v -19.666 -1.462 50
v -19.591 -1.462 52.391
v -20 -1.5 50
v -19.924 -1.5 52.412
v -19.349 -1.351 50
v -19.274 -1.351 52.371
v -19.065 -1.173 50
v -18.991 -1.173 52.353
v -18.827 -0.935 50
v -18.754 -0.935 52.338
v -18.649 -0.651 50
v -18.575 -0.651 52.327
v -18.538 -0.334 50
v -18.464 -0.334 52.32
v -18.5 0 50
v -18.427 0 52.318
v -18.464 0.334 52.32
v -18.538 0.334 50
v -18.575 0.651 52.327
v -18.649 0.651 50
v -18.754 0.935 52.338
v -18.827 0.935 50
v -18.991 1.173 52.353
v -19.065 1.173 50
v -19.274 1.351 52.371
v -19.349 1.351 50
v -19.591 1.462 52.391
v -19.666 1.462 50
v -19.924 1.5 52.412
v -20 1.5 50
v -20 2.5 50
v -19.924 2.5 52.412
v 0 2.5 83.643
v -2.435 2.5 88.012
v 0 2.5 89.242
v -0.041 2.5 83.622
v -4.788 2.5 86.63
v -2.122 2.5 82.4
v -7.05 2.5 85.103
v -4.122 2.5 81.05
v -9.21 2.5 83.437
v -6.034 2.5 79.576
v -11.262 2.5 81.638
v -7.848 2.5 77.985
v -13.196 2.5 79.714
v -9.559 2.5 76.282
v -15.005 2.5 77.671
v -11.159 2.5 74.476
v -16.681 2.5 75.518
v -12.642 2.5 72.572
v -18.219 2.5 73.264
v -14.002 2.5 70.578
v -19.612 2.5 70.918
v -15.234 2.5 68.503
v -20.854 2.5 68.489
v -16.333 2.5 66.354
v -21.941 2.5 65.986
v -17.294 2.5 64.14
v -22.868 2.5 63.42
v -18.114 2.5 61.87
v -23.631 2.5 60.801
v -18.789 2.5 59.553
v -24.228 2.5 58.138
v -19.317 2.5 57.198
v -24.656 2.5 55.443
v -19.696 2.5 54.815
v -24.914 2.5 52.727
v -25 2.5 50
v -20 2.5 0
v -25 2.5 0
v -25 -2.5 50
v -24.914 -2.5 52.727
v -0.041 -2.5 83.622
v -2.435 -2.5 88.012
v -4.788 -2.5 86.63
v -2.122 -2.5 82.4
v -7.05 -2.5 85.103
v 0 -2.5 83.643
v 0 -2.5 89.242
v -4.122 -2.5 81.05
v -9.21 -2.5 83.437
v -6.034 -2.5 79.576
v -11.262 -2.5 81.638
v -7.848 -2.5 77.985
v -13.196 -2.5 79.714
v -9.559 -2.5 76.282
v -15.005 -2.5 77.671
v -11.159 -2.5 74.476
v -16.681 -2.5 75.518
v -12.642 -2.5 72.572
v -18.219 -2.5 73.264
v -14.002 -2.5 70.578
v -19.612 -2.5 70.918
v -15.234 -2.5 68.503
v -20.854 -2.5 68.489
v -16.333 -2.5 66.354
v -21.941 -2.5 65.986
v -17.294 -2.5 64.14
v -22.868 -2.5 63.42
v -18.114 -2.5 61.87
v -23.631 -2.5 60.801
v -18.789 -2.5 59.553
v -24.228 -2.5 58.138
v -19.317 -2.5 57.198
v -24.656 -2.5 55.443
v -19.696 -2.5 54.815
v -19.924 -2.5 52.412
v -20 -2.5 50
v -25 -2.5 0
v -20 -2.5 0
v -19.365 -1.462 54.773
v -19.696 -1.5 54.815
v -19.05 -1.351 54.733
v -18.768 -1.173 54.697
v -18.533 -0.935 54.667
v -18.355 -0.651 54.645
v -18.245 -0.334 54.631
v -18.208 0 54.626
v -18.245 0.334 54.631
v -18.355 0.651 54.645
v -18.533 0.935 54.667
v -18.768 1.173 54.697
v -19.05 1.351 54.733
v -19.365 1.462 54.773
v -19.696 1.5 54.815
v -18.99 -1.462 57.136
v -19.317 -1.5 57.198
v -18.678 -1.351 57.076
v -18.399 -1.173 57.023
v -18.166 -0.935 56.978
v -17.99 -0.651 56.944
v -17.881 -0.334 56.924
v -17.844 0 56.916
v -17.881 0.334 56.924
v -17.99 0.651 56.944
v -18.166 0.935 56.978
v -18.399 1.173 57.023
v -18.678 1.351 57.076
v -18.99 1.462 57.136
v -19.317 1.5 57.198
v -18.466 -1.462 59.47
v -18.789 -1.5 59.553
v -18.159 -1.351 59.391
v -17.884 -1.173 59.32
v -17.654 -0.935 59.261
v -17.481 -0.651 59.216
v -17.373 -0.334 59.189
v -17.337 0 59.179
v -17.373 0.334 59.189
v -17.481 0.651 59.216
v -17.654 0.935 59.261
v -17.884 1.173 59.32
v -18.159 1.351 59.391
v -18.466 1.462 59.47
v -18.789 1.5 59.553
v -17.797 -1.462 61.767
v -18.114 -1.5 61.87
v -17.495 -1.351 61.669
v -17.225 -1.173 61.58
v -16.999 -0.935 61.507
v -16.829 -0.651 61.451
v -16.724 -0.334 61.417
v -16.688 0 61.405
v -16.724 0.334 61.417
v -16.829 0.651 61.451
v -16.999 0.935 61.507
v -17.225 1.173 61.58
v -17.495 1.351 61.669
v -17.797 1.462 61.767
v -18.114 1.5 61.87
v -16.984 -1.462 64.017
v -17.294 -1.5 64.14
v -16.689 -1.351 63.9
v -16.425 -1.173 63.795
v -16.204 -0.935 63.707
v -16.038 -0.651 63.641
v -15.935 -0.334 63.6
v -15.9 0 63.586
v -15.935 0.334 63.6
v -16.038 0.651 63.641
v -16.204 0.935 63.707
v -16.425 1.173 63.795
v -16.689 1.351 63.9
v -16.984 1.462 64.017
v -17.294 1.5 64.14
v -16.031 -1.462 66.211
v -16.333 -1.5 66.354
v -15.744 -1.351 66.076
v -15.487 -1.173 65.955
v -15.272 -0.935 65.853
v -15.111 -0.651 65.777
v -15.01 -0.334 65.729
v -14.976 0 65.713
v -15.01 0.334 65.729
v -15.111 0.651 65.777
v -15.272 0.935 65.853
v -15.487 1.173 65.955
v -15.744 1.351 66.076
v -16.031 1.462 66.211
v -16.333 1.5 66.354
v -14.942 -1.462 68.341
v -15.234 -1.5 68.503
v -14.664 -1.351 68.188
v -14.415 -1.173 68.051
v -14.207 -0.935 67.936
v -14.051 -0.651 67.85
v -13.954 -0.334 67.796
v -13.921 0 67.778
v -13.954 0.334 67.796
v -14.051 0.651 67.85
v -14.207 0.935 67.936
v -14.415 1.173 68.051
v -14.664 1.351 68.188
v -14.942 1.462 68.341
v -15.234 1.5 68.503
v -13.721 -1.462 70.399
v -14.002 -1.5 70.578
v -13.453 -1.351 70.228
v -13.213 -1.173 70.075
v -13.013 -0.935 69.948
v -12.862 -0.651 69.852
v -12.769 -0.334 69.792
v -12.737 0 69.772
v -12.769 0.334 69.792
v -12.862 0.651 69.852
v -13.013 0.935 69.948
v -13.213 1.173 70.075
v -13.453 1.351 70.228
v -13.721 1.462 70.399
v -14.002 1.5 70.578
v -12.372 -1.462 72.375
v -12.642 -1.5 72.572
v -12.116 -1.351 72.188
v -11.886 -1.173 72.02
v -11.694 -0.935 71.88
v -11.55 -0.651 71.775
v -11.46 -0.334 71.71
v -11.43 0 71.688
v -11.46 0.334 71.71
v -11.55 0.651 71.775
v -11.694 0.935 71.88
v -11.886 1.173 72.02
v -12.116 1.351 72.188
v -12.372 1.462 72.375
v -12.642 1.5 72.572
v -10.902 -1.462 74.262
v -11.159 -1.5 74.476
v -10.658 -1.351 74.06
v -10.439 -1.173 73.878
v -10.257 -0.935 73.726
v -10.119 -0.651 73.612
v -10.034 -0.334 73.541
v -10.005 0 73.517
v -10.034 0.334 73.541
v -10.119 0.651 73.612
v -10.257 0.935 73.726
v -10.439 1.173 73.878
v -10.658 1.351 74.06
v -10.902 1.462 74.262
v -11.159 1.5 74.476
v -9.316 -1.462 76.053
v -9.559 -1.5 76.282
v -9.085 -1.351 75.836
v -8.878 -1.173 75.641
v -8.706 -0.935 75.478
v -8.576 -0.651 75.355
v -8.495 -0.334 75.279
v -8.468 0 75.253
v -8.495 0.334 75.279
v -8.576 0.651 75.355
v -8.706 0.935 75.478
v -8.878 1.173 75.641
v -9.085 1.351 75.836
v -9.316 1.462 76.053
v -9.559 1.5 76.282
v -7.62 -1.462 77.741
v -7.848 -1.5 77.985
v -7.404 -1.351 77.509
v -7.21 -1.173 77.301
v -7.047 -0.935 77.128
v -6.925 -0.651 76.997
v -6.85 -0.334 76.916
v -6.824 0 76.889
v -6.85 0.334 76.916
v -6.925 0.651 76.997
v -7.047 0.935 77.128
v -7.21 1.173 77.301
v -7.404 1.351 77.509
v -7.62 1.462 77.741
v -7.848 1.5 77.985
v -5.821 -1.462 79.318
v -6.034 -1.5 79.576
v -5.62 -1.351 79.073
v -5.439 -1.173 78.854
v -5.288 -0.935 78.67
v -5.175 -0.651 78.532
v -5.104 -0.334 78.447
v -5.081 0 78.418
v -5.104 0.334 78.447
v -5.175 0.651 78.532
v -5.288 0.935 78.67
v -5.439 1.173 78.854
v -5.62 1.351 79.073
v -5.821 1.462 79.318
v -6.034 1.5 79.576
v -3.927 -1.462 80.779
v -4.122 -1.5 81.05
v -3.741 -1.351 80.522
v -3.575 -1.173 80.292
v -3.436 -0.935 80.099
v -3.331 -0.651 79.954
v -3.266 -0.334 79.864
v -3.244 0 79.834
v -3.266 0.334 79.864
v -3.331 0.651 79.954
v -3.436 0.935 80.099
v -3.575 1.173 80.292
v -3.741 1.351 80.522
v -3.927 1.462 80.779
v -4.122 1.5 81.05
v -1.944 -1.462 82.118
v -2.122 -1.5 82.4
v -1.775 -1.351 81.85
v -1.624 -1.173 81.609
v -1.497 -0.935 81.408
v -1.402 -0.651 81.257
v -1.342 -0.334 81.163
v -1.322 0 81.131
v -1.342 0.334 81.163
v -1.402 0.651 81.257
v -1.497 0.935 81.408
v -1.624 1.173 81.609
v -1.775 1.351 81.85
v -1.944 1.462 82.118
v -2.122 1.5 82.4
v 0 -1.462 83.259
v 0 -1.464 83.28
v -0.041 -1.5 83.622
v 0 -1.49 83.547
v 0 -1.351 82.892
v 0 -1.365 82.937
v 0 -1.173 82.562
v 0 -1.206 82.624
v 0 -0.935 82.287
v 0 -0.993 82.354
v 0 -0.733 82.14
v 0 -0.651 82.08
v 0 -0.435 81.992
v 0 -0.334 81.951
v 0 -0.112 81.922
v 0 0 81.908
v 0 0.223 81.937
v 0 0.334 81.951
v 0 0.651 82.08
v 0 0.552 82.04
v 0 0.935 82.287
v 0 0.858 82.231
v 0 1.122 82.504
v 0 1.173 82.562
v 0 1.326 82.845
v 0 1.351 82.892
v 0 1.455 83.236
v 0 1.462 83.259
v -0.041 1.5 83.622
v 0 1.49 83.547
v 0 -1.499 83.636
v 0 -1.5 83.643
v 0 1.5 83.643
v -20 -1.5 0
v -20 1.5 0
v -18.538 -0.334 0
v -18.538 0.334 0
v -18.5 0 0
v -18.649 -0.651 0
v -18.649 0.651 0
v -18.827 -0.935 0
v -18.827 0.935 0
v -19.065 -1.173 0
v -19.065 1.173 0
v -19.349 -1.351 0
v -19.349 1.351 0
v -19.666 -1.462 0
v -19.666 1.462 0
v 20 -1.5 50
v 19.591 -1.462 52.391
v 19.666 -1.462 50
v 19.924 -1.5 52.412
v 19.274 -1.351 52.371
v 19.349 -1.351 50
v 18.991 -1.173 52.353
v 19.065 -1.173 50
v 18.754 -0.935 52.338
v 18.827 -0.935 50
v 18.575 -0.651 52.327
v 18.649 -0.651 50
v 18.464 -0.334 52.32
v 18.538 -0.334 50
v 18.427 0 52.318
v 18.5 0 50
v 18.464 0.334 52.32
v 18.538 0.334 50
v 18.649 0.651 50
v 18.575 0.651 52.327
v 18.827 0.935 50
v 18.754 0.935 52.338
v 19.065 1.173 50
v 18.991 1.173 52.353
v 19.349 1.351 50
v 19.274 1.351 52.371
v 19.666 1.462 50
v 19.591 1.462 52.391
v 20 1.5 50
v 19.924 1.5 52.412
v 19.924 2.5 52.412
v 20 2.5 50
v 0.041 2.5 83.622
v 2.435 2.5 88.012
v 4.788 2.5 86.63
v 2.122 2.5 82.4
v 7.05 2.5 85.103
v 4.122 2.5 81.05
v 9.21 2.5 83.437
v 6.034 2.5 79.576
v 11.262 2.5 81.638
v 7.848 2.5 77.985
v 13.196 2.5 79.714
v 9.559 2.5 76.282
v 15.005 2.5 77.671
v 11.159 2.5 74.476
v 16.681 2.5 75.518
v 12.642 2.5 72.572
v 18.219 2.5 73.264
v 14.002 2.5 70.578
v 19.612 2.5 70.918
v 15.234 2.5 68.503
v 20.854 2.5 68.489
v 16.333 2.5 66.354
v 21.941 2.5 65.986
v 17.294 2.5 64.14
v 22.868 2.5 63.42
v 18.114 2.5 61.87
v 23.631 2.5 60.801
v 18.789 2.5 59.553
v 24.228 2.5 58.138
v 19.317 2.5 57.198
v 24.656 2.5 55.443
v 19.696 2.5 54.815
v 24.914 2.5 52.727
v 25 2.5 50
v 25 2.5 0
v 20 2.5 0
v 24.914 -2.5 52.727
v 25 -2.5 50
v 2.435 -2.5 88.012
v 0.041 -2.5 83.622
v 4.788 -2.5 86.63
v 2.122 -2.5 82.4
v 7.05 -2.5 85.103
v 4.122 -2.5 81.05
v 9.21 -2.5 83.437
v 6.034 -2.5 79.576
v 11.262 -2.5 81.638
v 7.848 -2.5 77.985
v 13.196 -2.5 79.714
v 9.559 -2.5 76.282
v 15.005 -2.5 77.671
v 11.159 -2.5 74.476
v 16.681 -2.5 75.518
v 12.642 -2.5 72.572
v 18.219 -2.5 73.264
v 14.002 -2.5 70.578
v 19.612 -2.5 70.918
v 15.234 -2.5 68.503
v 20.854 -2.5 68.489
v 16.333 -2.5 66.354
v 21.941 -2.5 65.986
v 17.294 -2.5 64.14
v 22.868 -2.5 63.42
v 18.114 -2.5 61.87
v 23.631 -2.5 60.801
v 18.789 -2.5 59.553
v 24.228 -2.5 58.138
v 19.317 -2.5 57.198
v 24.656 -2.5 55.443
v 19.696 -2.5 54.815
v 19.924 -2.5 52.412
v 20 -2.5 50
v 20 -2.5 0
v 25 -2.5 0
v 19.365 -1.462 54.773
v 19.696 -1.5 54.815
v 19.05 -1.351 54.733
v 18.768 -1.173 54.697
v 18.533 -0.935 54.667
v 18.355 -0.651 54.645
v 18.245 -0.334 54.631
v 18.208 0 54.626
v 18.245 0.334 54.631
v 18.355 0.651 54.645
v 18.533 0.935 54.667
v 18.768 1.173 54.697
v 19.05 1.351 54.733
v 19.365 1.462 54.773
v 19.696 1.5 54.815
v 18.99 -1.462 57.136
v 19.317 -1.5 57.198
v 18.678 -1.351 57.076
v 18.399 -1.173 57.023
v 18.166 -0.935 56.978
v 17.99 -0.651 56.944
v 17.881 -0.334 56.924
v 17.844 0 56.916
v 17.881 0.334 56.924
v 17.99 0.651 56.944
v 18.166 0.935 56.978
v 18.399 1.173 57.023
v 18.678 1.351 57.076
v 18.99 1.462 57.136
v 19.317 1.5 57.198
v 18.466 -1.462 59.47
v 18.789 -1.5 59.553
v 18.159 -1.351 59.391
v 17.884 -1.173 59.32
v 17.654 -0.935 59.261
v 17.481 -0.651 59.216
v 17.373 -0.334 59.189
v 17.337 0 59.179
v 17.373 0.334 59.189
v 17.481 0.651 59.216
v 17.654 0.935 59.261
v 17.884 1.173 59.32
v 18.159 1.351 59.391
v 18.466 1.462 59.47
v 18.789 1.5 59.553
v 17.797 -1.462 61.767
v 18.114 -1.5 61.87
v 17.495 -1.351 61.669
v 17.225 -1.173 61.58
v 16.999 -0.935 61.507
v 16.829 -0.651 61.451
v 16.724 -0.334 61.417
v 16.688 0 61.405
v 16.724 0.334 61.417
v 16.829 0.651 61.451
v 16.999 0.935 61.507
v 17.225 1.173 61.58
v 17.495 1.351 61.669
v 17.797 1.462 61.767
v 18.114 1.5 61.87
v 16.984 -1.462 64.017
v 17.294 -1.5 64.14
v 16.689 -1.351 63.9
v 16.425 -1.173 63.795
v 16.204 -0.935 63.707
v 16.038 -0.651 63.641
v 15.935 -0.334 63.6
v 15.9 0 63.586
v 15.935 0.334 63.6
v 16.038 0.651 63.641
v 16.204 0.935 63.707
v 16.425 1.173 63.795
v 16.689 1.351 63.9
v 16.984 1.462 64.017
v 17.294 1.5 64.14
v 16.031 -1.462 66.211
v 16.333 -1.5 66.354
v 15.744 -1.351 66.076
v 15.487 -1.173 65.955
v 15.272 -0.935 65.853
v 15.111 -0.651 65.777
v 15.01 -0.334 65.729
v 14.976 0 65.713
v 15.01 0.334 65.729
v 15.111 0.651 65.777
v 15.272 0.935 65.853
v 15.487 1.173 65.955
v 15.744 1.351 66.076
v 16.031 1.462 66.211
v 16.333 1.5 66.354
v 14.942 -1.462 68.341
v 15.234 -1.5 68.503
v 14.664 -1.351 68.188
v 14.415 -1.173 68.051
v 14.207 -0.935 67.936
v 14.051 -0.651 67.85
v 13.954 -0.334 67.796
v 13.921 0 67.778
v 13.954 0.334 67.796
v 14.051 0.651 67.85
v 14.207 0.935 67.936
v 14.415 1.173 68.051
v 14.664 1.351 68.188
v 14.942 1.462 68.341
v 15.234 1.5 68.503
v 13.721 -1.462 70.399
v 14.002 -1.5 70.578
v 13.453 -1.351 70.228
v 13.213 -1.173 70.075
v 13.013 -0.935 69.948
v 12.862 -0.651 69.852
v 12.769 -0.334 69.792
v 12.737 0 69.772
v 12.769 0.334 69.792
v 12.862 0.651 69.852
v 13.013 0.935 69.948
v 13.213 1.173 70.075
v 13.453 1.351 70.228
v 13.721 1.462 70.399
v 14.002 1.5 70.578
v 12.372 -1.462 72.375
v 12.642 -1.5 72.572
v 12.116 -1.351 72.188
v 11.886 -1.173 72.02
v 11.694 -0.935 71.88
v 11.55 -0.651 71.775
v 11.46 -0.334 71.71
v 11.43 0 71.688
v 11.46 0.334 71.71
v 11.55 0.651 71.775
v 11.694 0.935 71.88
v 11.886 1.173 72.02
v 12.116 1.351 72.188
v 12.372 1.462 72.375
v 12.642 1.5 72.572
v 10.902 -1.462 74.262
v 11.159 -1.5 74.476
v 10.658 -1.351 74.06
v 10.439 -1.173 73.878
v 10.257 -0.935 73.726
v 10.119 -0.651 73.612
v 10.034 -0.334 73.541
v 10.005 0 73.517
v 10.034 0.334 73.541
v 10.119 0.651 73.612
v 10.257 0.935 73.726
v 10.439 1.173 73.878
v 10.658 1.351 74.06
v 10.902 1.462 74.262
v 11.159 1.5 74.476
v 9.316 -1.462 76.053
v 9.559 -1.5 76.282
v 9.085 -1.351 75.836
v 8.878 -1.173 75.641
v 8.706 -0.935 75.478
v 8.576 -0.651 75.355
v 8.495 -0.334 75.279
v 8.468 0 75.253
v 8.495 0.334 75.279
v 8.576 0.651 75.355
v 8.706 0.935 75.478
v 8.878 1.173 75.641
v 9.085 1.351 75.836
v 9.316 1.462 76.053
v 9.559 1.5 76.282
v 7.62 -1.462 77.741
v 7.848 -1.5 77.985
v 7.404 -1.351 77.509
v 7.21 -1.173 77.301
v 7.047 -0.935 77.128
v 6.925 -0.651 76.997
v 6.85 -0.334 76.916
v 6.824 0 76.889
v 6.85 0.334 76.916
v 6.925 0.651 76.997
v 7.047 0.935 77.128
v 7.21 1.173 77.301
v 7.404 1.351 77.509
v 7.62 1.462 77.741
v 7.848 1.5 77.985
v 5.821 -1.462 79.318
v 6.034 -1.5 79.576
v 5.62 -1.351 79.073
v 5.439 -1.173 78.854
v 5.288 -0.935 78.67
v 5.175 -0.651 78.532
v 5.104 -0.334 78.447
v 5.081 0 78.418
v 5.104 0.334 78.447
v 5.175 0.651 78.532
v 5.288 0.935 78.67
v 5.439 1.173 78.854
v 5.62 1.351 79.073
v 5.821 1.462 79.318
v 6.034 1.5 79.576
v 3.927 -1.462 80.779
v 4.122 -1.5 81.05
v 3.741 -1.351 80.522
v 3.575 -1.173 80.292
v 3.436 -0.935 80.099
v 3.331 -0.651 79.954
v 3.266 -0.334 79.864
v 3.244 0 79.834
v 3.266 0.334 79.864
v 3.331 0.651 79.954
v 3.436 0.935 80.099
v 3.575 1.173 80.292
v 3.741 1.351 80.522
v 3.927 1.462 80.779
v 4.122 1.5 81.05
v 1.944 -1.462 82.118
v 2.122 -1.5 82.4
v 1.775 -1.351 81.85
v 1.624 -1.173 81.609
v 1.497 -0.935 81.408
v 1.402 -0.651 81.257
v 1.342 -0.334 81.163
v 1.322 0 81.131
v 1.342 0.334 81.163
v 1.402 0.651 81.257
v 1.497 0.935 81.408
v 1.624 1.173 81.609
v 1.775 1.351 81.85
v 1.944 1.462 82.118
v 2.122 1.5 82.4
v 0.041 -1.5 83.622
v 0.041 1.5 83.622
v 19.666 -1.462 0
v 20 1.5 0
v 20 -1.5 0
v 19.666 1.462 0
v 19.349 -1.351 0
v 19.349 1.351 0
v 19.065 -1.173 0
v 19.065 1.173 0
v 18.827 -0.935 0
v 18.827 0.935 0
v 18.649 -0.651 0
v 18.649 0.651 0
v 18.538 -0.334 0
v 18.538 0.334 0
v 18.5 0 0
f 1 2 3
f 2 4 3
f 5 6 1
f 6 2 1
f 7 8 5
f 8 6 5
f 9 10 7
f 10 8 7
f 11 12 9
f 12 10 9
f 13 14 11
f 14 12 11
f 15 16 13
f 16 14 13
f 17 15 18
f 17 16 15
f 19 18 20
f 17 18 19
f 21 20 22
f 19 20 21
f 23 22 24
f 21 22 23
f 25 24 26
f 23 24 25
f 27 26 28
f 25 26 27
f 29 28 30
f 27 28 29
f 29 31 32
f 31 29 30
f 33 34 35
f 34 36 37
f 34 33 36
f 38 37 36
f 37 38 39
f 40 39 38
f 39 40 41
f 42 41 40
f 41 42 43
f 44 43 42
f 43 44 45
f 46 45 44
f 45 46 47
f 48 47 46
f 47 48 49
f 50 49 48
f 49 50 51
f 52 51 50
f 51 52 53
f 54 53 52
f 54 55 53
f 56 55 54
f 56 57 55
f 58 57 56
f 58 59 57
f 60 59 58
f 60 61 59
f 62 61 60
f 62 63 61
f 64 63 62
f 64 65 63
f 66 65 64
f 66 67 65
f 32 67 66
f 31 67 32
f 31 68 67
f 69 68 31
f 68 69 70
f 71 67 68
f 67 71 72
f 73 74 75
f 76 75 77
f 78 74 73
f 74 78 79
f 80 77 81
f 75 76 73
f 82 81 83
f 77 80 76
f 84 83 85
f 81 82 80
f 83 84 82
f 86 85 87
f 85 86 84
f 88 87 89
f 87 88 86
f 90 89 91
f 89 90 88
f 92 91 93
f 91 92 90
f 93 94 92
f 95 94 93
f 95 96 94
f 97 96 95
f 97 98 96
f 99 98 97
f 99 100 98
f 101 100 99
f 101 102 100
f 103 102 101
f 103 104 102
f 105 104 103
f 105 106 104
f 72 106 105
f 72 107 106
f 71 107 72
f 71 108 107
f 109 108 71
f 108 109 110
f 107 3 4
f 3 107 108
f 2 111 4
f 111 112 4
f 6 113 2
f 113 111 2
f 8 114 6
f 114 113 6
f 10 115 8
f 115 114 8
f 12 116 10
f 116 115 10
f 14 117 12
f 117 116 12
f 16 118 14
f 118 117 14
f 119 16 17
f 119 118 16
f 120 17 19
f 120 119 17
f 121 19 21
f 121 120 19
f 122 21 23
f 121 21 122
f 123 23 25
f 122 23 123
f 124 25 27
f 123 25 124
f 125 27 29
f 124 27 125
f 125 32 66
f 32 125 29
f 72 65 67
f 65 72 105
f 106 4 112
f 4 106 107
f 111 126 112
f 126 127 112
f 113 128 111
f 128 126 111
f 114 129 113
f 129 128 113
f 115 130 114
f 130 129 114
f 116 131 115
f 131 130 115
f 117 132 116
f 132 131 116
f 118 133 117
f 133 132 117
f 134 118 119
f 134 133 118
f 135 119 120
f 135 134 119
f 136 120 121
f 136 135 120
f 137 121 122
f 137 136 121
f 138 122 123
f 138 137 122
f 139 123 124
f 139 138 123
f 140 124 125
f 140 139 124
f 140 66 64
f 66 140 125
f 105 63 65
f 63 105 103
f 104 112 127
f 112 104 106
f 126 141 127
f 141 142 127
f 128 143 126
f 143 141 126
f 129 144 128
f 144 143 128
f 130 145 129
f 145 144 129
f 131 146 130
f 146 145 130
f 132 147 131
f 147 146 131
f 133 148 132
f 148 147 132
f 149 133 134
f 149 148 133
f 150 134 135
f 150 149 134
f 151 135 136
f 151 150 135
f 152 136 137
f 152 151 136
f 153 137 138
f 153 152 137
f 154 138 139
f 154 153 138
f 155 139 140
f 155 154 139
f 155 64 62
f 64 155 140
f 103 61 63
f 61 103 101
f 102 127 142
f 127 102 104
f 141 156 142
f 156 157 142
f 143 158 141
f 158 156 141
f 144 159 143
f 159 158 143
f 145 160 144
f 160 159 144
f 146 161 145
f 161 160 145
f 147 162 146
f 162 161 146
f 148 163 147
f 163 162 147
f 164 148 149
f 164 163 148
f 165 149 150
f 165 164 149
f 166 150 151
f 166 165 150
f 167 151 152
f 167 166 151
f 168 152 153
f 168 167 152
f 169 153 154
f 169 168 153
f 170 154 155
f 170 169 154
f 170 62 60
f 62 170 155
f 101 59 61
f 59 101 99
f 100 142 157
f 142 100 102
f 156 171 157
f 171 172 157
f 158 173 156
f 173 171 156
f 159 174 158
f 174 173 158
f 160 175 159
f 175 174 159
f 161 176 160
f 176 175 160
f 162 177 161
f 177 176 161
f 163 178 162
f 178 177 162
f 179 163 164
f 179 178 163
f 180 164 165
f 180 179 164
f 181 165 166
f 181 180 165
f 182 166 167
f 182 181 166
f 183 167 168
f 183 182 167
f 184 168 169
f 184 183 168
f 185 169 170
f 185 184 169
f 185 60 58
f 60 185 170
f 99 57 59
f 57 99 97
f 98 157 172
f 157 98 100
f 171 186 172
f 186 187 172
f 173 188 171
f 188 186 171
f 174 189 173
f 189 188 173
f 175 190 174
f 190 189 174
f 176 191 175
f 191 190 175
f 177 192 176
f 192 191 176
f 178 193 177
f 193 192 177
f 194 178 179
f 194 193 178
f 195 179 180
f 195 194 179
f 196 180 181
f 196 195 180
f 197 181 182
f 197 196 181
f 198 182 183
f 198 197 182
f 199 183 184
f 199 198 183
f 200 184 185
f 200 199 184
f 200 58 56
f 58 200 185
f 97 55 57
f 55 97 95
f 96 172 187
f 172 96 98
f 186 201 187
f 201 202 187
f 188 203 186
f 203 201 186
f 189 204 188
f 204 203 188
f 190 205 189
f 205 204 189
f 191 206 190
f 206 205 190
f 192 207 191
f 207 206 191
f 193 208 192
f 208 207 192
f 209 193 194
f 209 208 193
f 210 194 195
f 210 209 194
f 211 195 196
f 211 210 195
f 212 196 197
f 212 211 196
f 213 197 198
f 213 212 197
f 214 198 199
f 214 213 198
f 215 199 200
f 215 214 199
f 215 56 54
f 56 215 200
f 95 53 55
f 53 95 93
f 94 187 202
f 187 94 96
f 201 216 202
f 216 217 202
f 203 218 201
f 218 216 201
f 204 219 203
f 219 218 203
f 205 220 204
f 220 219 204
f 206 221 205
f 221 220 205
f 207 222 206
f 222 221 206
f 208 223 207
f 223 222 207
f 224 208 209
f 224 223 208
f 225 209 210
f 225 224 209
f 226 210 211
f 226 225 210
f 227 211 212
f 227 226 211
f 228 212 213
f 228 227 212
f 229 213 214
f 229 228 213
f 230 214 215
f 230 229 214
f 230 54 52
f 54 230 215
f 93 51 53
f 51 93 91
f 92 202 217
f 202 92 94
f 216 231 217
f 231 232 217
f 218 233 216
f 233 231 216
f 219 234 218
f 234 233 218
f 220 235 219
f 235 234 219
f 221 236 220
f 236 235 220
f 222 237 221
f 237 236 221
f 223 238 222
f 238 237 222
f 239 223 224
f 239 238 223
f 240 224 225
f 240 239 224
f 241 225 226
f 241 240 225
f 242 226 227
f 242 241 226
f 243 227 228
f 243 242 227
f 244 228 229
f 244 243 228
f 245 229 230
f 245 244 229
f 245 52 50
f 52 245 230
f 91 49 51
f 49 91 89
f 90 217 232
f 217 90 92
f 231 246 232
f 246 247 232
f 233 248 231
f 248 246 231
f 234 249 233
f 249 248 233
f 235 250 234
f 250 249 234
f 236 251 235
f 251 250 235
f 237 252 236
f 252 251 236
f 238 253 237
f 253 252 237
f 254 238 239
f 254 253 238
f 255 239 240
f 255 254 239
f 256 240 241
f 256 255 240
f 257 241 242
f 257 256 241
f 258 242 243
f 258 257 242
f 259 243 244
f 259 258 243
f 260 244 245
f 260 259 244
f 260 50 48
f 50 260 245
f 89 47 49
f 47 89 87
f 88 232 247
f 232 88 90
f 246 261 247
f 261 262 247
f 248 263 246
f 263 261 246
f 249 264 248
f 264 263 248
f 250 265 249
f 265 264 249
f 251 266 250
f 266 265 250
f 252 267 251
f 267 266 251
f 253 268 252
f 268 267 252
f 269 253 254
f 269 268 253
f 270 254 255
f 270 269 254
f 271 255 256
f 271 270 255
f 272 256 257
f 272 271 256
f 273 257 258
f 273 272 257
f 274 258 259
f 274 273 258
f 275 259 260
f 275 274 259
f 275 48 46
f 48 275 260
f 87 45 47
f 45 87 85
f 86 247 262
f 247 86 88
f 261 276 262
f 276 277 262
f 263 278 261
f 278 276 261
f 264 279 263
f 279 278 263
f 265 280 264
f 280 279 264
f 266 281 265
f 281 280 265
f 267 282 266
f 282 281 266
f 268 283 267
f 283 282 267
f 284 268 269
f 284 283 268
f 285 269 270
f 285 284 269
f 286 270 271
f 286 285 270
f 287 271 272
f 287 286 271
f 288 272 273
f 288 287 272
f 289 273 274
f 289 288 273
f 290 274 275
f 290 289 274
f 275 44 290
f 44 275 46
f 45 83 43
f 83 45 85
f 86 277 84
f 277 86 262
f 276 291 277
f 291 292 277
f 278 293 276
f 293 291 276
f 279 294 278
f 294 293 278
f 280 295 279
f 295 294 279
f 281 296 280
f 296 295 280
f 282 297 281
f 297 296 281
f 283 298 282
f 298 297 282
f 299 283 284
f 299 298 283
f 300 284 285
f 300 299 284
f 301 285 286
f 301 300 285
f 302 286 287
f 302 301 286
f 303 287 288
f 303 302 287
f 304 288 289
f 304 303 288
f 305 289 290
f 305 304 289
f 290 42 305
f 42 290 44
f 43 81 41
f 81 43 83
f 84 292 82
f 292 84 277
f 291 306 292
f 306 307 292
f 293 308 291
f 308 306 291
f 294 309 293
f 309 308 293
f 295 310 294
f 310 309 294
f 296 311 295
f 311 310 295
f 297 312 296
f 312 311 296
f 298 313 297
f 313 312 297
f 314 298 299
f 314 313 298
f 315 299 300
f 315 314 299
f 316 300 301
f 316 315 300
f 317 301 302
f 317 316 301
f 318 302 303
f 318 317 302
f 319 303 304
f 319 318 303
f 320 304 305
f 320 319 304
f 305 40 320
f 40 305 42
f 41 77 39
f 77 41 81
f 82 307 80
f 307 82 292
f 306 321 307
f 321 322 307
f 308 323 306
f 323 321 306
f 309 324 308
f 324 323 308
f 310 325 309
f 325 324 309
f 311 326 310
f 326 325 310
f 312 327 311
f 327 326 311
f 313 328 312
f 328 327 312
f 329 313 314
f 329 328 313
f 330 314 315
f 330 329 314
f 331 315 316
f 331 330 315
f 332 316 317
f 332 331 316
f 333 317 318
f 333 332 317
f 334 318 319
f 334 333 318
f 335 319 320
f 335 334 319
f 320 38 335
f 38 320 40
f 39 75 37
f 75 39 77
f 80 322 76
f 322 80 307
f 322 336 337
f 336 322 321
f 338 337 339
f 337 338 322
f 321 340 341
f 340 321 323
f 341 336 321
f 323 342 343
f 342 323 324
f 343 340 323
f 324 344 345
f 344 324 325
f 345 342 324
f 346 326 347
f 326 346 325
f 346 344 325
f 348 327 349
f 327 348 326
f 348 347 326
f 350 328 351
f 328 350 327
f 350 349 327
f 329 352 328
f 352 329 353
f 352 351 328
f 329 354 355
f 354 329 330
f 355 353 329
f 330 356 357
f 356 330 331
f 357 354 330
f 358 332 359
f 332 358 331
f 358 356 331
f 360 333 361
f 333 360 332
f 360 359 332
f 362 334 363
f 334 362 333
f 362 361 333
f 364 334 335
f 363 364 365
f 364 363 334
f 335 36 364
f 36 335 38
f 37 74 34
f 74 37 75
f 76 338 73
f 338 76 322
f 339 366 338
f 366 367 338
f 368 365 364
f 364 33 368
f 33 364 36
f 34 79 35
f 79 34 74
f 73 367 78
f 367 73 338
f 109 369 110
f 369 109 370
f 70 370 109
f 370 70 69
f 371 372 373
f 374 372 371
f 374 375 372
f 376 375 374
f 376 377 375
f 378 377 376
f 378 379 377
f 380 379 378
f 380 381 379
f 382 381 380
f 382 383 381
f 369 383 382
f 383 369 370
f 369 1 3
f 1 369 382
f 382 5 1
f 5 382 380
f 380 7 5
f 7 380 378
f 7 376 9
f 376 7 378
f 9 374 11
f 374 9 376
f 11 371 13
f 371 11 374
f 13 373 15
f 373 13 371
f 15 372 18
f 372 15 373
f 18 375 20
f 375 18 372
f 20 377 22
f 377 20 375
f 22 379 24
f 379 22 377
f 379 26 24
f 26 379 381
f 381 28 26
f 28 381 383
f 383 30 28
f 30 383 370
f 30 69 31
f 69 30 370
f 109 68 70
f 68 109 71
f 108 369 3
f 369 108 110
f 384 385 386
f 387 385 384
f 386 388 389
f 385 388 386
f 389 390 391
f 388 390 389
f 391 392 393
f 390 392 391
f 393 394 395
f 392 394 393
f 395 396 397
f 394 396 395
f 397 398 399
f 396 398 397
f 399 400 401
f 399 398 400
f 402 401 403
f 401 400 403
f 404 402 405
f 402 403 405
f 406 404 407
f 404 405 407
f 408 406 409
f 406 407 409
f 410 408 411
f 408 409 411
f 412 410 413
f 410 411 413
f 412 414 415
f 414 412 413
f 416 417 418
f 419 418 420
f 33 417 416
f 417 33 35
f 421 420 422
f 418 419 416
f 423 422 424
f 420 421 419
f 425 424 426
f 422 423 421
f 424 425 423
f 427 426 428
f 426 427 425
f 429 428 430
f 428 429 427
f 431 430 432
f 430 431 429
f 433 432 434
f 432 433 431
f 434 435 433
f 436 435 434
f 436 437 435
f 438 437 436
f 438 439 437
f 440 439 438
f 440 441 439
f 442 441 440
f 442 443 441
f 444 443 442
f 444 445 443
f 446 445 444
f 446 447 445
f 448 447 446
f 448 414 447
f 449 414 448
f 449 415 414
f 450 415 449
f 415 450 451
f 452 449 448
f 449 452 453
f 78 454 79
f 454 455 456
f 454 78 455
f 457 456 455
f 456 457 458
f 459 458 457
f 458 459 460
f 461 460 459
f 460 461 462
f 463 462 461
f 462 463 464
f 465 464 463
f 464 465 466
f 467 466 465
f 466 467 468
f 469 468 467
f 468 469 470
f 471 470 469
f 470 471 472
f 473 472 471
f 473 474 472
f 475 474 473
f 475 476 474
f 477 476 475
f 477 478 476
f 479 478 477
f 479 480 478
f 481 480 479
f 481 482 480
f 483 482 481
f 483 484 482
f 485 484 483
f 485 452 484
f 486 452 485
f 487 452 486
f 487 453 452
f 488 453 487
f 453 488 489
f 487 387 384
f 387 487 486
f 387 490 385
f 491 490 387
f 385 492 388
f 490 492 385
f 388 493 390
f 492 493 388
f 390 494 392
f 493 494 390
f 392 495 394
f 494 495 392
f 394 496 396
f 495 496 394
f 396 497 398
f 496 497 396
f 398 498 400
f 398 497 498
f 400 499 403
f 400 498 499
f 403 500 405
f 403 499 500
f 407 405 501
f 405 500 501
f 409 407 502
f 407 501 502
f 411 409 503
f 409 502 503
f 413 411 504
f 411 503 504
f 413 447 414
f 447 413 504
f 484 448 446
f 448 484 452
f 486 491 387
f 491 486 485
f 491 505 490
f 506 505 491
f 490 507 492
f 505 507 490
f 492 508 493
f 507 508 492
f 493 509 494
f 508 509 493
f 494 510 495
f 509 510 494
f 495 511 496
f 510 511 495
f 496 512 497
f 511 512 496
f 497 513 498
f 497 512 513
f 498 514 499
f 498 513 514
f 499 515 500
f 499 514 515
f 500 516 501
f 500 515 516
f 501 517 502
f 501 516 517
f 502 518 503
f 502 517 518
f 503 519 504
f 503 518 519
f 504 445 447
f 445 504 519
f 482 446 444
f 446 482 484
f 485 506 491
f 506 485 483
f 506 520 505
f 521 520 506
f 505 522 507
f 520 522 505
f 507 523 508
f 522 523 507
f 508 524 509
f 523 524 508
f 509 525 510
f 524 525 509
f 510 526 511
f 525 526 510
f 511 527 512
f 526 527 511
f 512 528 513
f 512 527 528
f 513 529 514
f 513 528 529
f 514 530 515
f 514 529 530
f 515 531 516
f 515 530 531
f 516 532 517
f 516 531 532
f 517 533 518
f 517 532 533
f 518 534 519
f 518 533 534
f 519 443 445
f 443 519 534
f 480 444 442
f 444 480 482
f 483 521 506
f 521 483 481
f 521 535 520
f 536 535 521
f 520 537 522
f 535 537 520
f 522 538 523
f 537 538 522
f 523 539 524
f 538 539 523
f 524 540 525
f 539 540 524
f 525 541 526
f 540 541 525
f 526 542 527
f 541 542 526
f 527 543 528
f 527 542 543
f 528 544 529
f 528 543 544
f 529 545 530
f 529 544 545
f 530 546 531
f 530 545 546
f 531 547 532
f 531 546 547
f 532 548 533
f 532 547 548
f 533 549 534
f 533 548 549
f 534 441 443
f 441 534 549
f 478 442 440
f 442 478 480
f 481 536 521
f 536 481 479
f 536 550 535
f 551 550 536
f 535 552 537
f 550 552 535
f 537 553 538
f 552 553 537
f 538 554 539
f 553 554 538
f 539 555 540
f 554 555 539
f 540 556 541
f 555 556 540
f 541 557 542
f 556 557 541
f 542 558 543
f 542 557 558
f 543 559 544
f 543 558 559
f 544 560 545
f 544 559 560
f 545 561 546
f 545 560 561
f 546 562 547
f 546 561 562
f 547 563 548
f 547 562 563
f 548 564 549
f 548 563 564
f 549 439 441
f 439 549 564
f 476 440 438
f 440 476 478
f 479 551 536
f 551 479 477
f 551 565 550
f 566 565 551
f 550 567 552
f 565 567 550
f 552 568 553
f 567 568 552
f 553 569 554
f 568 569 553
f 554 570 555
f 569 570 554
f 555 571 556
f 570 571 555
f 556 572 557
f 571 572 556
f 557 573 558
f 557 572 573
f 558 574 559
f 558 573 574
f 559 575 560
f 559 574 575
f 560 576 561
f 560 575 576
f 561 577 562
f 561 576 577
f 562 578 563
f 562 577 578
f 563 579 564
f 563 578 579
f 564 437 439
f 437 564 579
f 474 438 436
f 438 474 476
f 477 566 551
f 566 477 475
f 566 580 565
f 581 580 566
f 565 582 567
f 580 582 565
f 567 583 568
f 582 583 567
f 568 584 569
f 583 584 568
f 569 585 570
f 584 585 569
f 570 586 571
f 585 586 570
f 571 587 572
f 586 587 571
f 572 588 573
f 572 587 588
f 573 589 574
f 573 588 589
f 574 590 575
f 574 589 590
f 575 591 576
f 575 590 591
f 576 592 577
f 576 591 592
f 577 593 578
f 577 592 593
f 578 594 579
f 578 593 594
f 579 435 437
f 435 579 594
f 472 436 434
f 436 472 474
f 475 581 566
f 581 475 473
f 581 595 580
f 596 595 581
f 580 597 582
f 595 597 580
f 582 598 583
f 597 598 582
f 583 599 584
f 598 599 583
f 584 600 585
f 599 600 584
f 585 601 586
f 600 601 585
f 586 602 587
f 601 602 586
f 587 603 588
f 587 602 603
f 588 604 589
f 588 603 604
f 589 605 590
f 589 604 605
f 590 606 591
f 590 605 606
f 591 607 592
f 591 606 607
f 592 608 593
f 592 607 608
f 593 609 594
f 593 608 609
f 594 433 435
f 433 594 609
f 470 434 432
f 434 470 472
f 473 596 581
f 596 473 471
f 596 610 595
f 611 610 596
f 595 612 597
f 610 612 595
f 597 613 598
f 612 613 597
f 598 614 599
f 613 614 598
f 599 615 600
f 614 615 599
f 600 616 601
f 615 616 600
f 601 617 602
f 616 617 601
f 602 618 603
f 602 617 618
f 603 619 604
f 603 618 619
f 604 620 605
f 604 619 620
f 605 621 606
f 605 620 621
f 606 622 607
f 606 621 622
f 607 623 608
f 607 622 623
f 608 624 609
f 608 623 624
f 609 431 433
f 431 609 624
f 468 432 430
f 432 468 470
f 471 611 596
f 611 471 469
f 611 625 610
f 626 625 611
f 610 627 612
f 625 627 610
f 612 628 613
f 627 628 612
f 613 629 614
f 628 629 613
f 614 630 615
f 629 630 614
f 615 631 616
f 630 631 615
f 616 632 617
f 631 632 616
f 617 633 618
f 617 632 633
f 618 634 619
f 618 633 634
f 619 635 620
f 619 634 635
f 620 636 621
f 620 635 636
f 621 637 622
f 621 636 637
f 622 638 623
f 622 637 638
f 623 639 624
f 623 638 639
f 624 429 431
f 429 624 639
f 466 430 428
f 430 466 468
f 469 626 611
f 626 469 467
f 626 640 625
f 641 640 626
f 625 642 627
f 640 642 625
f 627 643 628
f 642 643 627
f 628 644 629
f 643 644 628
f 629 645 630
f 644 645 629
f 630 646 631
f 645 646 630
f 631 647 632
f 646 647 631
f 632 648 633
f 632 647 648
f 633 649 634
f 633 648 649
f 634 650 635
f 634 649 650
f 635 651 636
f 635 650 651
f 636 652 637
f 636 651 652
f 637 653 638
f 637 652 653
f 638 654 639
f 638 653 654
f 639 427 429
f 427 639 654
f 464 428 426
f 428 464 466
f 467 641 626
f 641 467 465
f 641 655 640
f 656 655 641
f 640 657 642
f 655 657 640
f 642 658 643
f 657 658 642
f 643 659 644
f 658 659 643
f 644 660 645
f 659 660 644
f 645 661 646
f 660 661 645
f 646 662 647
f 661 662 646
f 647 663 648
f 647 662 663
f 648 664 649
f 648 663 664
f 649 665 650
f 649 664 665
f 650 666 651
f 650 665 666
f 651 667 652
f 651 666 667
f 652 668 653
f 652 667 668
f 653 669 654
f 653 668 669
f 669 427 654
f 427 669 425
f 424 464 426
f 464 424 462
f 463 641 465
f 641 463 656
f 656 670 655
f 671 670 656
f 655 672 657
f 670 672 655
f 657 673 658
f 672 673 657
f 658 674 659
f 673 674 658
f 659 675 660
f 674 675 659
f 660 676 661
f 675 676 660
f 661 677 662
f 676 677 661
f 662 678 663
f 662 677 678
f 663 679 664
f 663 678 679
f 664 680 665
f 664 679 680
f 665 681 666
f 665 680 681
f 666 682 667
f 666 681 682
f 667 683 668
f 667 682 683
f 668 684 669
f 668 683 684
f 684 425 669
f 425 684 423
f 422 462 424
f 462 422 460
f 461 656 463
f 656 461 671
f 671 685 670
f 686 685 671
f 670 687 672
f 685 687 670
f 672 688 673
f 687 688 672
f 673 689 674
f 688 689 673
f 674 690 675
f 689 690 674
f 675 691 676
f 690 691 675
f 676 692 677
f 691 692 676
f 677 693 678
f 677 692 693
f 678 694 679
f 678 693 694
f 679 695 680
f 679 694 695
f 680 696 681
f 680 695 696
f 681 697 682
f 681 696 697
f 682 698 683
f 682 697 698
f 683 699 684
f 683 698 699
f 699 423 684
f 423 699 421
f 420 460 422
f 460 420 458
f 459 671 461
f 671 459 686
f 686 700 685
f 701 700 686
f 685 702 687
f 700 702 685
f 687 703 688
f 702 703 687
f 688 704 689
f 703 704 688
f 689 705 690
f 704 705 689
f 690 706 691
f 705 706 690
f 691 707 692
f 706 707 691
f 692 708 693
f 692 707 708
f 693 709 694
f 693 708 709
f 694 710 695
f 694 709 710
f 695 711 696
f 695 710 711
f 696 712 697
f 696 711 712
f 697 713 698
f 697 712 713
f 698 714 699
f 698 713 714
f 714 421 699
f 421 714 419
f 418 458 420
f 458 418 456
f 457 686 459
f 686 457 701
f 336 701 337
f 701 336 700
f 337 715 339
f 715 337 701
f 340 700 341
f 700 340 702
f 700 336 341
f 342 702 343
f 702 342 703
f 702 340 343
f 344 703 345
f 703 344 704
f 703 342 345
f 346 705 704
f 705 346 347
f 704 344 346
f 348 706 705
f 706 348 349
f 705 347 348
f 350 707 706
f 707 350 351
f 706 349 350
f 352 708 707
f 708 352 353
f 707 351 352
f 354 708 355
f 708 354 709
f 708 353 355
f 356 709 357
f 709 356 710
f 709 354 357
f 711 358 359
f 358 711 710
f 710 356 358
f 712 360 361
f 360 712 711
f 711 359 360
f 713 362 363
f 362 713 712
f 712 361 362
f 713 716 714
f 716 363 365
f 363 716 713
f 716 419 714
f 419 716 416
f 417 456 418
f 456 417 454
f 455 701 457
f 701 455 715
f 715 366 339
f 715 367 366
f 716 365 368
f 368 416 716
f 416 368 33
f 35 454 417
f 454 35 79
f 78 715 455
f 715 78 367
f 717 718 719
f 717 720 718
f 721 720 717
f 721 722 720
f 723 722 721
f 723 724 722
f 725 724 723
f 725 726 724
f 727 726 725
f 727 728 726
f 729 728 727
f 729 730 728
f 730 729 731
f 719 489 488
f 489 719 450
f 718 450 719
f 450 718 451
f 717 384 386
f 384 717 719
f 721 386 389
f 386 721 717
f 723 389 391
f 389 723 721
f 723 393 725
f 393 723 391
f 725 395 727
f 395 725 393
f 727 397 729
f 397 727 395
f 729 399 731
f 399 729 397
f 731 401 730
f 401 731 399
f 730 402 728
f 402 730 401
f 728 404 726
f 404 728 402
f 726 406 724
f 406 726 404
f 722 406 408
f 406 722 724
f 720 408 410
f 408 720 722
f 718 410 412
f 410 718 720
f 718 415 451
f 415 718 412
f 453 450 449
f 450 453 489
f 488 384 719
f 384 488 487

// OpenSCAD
module arch(
    arch_width  = 50,
    arch_base = 5,
    arch_angle = 65,
    pillar_height = 50,) {
        
    arch_radius = arch_width / (2 - 2 * cos(arch_angle) );
    
    module basic_shape() {
        union() {
        translate( [0, -arch_base / 2] )
            square( arch_base );

        translate( [arch_base, 0])
            circle( d = arch_base * 3 / 5, $fn=28);
        }
    }

    translate( [0, 0, pillar_height] )
    for (m = [0:1] )
    mirror( [m, 0, 0] )
    difference() {
    translate( [cos(arch_angle) * arch_radius, 0, 0] )
    union() {
        rotate( [-90, 0, 0])
        rotate_extrude( angle = arch_angle, $fn = 100 )
        translate( [-arch_radius, 0] )
        basic_shape();

        translate( [0, 0, -pillar_height] )
        linear_extrude( height = pillar_height )
        translate( [-arch_radius, 0] )
        basic_shape();
            }
       translate([
            0, 
            -arch_base, 
            sin(arch_angle) * arch_radius - 5 * arch_base
        ])
        cube( 5 * arch_base);
    }
    
    }
    
arch();
